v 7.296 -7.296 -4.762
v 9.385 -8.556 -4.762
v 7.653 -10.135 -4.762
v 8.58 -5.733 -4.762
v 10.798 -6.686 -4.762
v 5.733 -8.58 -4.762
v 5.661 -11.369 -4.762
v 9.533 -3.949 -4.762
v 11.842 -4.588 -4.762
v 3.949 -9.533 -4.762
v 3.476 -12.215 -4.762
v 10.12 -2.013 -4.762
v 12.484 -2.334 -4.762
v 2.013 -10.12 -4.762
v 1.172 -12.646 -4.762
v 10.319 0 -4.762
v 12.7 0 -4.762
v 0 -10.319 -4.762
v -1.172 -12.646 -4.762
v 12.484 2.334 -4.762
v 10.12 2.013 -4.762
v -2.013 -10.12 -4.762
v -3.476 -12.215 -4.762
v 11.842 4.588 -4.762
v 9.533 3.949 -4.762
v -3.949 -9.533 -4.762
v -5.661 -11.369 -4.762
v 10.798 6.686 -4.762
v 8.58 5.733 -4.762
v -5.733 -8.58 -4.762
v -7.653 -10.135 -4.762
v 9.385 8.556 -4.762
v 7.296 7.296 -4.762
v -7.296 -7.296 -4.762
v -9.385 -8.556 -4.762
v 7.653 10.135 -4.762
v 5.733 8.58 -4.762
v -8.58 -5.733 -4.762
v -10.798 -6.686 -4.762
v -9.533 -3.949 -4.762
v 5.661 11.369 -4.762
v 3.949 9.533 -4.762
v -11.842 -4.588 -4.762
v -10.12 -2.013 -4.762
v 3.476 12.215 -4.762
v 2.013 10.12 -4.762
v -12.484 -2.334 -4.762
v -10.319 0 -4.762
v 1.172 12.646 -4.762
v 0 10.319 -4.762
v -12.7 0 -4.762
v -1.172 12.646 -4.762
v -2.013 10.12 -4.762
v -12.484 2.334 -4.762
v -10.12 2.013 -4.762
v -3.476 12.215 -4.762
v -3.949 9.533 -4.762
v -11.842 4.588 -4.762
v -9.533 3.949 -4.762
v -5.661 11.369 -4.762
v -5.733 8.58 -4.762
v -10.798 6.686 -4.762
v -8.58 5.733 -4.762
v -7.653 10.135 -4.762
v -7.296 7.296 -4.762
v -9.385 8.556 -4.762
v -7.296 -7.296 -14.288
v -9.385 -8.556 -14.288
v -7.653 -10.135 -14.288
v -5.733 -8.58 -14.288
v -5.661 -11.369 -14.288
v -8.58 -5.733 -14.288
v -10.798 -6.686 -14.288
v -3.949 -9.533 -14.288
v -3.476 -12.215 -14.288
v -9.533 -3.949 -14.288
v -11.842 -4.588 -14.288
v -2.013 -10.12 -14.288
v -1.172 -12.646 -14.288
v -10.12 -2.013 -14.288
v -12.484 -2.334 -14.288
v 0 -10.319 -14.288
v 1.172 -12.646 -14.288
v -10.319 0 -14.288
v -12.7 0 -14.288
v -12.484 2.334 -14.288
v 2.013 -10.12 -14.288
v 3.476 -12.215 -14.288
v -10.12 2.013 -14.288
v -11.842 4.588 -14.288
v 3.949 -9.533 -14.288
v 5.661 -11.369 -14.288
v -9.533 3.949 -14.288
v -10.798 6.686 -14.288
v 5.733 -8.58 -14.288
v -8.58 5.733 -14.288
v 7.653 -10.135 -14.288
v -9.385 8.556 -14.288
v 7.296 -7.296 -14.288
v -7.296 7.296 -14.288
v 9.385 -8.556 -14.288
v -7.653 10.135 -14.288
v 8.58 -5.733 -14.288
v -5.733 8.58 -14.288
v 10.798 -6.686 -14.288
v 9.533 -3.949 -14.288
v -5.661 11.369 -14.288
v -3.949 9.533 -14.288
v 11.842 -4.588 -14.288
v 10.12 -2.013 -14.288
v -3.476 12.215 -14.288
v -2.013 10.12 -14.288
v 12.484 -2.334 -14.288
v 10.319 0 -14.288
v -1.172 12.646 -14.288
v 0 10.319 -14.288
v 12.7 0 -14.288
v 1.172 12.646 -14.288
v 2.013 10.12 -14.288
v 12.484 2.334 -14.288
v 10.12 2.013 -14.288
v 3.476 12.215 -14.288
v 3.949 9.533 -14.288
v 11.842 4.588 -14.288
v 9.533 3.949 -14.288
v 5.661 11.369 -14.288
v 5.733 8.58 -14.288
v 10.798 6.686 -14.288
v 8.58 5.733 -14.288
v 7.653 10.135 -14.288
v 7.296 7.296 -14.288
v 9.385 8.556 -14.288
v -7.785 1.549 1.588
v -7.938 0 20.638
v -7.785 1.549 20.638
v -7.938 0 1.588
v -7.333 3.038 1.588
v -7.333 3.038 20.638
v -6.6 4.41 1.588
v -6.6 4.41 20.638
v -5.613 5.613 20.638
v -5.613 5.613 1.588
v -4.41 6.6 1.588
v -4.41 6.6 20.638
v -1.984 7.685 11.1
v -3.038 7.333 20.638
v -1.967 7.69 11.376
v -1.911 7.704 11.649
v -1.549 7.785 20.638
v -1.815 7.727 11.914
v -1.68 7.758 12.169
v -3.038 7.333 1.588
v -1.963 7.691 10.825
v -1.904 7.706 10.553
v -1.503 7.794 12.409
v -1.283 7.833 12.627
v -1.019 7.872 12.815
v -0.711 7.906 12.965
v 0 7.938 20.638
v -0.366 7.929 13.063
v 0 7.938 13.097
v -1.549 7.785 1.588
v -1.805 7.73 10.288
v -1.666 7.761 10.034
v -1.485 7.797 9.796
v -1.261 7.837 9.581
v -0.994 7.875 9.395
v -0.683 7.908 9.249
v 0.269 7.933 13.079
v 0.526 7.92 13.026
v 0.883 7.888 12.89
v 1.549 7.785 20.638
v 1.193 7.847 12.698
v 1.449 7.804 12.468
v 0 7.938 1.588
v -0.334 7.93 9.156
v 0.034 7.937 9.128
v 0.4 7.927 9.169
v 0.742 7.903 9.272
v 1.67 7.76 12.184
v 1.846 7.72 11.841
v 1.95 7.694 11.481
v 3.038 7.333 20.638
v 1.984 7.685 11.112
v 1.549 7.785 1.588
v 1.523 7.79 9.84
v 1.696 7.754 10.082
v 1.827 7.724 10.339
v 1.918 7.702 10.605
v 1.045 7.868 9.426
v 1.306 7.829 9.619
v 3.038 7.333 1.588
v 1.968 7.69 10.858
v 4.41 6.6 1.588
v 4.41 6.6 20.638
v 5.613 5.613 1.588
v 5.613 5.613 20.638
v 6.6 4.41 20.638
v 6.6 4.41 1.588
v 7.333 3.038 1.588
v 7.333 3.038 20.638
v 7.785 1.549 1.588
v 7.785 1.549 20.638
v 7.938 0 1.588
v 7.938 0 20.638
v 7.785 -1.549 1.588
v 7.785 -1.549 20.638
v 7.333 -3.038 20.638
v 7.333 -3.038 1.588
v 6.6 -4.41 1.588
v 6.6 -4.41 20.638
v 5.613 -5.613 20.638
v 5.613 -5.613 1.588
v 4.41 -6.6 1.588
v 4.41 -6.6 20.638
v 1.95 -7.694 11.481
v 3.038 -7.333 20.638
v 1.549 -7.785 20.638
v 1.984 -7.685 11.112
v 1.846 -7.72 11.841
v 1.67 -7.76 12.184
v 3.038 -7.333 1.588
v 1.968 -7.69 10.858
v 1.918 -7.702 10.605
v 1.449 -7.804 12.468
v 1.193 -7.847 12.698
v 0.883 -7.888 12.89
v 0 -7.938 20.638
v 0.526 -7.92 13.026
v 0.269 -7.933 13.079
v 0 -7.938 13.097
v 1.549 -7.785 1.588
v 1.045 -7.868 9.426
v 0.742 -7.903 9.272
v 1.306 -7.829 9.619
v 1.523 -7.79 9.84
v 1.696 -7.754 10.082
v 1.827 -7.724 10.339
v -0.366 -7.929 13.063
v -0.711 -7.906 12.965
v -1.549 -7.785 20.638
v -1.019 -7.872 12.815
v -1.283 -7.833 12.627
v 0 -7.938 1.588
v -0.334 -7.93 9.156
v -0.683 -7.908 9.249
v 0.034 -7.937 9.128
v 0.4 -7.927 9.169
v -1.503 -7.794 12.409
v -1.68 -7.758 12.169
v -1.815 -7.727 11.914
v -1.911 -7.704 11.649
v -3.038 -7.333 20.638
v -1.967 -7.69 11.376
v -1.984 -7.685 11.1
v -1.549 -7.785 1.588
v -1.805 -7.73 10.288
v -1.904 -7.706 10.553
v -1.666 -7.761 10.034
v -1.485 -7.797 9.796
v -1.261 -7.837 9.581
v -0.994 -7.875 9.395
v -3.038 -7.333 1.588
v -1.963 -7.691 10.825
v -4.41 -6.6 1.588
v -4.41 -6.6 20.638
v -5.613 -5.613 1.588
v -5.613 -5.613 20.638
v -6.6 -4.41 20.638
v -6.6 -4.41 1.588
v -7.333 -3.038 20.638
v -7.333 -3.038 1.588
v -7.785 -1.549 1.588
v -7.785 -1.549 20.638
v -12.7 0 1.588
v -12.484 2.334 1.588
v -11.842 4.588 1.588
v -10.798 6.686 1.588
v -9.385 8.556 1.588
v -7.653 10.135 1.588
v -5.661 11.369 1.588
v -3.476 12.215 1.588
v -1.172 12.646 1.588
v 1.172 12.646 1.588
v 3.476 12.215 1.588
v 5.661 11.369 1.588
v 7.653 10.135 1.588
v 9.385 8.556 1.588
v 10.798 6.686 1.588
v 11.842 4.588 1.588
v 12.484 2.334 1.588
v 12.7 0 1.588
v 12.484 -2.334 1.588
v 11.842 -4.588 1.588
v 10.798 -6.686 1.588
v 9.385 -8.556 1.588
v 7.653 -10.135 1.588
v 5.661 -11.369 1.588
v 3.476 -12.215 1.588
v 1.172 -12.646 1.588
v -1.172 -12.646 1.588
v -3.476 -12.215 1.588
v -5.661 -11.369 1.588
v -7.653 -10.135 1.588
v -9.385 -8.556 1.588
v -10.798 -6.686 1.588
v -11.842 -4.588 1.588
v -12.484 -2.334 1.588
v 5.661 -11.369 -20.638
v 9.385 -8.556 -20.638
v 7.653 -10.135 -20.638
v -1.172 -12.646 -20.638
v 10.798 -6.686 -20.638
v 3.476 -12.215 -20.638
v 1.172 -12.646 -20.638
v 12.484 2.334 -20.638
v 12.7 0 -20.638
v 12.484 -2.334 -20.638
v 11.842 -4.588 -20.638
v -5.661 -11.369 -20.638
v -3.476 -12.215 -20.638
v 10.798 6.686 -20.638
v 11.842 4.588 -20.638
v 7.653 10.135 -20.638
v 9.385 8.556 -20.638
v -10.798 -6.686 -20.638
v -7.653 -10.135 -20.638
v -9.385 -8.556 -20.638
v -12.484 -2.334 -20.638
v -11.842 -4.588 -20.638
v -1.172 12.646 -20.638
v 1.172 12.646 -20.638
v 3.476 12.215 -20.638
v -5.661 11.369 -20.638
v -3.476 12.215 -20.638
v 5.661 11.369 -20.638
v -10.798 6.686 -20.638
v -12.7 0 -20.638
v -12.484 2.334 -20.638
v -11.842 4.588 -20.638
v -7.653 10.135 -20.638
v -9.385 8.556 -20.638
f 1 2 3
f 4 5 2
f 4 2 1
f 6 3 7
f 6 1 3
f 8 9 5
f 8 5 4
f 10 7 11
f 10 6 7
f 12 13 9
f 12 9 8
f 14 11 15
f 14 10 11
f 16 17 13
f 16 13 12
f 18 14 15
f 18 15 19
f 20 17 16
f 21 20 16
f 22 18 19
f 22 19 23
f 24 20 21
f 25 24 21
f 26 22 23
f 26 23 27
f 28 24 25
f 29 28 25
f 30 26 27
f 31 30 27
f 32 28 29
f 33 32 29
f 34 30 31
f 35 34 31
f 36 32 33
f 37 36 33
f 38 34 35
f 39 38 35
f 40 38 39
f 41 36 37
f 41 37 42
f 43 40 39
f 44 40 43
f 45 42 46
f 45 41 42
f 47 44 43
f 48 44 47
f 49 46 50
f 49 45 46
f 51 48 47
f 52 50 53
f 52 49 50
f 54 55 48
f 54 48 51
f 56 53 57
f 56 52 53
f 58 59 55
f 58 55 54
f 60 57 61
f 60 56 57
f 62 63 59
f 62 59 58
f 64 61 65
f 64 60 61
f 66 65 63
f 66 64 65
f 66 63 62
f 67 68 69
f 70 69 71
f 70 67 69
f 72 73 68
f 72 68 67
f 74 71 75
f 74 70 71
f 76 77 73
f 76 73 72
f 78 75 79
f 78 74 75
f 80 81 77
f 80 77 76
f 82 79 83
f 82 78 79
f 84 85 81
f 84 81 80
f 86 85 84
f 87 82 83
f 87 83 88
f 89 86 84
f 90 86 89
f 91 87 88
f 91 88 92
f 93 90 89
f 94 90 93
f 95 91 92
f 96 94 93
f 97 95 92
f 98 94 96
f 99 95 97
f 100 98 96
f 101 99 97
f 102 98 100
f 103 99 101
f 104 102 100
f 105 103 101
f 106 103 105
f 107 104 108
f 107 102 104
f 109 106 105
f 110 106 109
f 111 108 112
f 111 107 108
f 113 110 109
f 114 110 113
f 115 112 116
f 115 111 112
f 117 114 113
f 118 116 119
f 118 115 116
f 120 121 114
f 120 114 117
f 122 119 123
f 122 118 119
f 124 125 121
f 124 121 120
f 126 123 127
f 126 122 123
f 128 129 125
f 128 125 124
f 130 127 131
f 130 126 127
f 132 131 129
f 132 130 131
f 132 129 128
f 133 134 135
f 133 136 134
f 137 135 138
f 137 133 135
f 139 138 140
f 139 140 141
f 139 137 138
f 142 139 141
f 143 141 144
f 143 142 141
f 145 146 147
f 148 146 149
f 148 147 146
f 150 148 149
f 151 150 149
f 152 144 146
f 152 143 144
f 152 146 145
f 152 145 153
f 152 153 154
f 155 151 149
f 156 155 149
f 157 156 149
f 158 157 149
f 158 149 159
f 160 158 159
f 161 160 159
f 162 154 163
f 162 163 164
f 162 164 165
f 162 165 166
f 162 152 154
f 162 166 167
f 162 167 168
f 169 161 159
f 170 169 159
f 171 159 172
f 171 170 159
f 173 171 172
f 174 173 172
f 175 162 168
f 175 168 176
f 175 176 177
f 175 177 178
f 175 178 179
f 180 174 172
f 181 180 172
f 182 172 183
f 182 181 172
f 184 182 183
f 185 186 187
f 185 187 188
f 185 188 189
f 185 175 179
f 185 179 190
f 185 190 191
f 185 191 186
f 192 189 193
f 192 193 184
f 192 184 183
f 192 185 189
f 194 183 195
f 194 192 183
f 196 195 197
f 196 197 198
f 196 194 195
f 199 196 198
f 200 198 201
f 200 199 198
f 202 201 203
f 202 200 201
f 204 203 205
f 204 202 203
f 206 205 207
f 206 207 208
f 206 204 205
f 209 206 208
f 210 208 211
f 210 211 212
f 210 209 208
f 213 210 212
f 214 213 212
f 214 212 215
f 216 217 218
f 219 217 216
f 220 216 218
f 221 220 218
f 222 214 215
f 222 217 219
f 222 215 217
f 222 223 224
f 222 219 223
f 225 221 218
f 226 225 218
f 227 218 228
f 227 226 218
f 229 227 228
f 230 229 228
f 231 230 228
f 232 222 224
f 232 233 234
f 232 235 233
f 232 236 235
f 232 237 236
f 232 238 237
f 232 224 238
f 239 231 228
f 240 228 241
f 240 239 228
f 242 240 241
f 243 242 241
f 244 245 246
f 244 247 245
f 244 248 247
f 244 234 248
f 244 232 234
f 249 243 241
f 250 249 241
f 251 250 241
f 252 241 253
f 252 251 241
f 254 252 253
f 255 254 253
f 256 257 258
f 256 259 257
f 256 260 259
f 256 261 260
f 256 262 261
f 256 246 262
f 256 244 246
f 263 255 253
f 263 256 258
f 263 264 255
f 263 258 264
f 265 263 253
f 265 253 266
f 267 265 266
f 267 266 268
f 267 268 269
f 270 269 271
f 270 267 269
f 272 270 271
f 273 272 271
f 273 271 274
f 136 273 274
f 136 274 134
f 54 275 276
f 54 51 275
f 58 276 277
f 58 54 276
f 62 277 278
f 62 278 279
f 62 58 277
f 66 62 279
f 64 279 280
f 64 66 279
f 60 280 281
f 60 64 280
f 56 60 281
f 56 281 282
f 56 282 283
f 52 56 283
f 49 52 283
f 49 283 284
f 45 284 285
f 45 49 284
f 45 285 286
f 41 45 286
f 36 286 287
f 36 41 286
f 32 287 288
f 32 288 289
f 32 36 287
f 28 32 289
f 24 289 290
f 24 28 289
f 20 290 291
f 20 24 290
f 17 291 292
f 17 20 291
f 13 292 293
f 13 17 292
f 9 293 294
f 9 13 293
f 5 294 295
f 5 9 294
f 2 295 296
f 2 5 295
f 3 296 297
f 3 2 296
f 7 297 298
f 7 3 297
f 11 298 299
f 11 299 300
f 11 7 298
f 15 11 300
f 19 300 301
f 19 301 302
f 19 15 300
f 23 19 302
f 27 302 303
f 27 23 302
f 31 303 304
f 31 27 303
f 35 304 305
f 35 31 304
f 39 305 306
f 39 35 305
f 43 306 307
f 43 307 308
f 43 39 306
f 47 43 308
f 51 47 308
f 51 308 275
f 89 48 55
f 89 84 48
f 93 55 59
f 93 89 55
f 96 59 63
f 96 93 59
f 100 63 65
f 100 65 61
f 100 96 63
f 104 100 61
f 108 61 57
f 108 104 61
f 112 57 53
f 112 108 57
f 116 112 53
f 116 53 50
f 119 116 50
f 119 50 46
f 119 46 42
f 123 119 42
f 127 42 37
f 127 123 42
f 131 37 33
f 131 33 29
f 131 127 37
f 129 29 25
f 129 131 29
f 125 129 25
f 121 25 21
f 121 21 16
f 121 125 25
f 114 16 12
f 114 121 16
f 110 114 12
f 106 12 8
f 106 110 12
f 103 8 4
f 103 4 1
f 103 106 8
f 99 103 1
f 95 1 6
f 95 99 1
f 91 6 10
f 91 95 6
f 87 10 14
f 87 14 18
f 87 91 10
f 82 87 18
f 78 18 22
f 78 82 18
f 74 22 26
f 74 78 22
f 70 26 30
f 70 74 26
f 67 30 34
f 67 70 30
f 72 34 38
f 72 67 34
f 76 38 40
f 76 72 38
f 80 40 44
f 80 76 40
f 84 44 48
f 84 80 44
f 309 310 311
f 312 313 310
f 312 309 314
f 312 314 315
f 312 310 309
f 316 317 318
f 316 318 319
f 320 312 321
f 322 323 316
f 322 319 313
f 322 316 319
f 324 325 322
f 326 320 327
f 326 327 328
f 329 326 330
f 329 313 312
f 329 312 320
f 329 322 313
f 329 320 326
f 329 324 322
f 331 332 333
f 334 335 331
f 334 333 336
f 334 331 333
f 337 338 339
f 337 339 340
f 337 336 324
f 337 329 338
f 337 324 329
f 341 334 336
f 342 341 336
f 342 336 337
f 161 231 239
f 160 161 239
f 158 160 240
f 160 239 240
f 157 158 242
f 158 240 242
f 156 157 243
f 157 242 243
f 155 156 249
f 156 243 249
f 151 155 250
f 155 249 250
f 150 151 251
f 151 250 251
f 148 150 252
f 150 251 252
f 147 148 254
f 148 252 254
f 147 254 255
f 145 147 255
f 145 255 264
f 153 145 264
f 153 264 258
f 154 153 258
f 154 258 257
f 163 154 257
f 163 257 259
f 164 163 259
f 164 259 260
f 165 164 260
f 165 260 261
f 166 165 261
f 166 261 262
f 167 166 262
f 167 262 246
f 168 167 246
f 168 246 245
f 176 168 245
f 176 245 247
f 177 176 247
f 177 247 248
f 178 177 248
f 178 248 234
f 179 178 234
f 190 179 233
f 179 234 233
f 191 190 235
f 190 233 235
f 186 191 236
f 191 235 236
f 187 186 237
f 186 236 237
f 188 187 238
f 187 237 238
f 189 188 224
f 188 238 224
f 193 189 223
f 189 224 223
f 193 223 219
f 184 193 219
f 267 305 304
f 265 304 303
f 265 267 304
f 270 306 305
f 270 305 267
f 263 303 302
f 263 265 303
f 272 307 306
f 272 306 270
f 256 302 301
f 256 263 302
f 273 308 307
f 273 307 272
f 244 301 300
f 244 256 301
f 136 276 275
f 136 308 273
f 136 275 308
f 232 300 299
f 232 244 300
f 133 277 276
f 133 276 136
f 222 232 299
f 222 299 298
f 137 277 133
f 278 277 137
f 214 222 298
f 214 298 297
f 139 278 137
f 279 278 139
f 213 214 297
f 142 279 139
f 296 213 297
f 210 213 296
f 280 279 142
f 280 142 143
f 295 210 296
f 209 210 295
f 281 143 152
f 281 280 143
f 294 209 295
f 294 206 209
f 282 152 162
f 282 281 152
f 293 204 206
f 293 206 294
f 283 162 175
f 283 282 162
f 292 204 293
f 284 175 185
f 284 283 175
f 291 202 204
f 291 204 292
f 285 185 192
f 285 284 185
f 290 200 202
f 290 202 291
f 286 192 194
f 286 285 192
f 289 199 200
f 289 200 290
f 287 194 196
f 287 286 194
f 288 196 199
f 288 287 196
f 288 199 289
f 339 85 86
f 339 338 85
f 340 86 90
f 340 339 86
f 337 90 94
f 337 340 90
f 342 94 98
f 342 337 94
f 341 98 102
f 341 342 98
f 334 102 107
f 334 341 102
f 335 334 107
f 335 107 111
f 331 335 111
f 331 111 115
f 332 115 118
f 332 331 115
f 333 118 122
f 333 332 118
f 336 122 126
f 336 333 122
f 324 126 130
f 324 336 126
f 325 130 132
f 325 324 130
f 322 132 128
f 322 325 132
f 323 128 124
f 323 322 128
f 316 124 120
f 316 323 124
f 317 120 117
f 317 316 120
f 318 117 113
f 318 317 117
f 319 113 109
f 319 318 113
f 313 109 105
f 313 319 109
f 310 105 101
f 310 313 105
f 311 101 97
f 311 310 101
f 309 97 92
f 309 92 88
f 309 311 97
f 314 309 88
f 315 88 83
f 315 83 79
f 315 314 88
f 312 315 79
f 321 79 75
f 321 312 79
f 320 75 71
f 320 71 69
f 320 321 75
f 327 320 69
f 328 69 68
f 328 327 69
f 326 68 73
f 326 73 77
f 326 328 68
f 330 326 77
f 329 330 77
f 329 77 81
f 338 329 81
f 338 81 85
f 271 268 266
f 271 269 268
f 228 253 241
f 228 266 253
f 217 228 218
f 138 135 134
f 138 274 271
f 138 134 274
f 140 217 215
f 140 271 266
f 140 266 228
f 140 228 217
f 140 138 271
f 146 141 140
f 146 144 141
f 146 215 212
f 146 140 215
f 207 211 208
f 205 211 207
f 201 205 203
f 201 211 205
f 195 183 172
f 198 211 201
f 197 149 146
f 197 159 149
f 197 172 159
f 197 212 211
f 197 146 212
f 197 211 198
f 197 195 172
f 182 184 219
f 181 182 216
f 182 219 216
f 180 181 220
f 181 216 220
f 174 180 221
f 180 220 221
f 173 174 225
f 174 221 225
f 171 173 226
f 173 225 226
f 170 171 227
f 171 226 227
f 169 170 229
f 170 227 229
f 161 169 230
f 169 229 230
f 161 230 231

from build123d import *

# Parameters (mm, degrees)
F3_DEPTH      = 12.701
F3_DEPTH_BACK = 12.701


with BuildPart() as f1:
    # F0 (on Front) → F1 (revolve)
    with BuildSketch(Plane.XZ):
        Polygon((0, -20.6375), (0, 20.6375), (-7.9375, 20.6375), (-7.9375, 1.5875), (-12.7, 1.5875), (-12.7, -4.7625), (-10.31875, -4.7625), (-10.31875, -14.2875), (-12.7, -14.2875), (-12.7, -20.6375), align=None)
    revolve(axis=Axis((0, 0, 0), (0, 0, -1)))

    # F2 (on Front) → F3 (cut, two sides)
    with BuildSketch(Plane.XZ) as f3_sk:
        with BuildLine():
            ThreePointArc((0, 13.096875), (-1.403165, 9.709335), (1.984375, 11.1125))
            ThreePointArc((1.984375, 11.1125), (1.403165, 12.515665), (0, 13.096875))
        make_face()
    extrude(amount=F3_DEPTH, mode=Mode.SUBTRACT)
    extrude(f3_sk.sketch, amount=-F3_DEPTH_BACK, mode=Mode.SUBTRACT)


solid = f1.part
